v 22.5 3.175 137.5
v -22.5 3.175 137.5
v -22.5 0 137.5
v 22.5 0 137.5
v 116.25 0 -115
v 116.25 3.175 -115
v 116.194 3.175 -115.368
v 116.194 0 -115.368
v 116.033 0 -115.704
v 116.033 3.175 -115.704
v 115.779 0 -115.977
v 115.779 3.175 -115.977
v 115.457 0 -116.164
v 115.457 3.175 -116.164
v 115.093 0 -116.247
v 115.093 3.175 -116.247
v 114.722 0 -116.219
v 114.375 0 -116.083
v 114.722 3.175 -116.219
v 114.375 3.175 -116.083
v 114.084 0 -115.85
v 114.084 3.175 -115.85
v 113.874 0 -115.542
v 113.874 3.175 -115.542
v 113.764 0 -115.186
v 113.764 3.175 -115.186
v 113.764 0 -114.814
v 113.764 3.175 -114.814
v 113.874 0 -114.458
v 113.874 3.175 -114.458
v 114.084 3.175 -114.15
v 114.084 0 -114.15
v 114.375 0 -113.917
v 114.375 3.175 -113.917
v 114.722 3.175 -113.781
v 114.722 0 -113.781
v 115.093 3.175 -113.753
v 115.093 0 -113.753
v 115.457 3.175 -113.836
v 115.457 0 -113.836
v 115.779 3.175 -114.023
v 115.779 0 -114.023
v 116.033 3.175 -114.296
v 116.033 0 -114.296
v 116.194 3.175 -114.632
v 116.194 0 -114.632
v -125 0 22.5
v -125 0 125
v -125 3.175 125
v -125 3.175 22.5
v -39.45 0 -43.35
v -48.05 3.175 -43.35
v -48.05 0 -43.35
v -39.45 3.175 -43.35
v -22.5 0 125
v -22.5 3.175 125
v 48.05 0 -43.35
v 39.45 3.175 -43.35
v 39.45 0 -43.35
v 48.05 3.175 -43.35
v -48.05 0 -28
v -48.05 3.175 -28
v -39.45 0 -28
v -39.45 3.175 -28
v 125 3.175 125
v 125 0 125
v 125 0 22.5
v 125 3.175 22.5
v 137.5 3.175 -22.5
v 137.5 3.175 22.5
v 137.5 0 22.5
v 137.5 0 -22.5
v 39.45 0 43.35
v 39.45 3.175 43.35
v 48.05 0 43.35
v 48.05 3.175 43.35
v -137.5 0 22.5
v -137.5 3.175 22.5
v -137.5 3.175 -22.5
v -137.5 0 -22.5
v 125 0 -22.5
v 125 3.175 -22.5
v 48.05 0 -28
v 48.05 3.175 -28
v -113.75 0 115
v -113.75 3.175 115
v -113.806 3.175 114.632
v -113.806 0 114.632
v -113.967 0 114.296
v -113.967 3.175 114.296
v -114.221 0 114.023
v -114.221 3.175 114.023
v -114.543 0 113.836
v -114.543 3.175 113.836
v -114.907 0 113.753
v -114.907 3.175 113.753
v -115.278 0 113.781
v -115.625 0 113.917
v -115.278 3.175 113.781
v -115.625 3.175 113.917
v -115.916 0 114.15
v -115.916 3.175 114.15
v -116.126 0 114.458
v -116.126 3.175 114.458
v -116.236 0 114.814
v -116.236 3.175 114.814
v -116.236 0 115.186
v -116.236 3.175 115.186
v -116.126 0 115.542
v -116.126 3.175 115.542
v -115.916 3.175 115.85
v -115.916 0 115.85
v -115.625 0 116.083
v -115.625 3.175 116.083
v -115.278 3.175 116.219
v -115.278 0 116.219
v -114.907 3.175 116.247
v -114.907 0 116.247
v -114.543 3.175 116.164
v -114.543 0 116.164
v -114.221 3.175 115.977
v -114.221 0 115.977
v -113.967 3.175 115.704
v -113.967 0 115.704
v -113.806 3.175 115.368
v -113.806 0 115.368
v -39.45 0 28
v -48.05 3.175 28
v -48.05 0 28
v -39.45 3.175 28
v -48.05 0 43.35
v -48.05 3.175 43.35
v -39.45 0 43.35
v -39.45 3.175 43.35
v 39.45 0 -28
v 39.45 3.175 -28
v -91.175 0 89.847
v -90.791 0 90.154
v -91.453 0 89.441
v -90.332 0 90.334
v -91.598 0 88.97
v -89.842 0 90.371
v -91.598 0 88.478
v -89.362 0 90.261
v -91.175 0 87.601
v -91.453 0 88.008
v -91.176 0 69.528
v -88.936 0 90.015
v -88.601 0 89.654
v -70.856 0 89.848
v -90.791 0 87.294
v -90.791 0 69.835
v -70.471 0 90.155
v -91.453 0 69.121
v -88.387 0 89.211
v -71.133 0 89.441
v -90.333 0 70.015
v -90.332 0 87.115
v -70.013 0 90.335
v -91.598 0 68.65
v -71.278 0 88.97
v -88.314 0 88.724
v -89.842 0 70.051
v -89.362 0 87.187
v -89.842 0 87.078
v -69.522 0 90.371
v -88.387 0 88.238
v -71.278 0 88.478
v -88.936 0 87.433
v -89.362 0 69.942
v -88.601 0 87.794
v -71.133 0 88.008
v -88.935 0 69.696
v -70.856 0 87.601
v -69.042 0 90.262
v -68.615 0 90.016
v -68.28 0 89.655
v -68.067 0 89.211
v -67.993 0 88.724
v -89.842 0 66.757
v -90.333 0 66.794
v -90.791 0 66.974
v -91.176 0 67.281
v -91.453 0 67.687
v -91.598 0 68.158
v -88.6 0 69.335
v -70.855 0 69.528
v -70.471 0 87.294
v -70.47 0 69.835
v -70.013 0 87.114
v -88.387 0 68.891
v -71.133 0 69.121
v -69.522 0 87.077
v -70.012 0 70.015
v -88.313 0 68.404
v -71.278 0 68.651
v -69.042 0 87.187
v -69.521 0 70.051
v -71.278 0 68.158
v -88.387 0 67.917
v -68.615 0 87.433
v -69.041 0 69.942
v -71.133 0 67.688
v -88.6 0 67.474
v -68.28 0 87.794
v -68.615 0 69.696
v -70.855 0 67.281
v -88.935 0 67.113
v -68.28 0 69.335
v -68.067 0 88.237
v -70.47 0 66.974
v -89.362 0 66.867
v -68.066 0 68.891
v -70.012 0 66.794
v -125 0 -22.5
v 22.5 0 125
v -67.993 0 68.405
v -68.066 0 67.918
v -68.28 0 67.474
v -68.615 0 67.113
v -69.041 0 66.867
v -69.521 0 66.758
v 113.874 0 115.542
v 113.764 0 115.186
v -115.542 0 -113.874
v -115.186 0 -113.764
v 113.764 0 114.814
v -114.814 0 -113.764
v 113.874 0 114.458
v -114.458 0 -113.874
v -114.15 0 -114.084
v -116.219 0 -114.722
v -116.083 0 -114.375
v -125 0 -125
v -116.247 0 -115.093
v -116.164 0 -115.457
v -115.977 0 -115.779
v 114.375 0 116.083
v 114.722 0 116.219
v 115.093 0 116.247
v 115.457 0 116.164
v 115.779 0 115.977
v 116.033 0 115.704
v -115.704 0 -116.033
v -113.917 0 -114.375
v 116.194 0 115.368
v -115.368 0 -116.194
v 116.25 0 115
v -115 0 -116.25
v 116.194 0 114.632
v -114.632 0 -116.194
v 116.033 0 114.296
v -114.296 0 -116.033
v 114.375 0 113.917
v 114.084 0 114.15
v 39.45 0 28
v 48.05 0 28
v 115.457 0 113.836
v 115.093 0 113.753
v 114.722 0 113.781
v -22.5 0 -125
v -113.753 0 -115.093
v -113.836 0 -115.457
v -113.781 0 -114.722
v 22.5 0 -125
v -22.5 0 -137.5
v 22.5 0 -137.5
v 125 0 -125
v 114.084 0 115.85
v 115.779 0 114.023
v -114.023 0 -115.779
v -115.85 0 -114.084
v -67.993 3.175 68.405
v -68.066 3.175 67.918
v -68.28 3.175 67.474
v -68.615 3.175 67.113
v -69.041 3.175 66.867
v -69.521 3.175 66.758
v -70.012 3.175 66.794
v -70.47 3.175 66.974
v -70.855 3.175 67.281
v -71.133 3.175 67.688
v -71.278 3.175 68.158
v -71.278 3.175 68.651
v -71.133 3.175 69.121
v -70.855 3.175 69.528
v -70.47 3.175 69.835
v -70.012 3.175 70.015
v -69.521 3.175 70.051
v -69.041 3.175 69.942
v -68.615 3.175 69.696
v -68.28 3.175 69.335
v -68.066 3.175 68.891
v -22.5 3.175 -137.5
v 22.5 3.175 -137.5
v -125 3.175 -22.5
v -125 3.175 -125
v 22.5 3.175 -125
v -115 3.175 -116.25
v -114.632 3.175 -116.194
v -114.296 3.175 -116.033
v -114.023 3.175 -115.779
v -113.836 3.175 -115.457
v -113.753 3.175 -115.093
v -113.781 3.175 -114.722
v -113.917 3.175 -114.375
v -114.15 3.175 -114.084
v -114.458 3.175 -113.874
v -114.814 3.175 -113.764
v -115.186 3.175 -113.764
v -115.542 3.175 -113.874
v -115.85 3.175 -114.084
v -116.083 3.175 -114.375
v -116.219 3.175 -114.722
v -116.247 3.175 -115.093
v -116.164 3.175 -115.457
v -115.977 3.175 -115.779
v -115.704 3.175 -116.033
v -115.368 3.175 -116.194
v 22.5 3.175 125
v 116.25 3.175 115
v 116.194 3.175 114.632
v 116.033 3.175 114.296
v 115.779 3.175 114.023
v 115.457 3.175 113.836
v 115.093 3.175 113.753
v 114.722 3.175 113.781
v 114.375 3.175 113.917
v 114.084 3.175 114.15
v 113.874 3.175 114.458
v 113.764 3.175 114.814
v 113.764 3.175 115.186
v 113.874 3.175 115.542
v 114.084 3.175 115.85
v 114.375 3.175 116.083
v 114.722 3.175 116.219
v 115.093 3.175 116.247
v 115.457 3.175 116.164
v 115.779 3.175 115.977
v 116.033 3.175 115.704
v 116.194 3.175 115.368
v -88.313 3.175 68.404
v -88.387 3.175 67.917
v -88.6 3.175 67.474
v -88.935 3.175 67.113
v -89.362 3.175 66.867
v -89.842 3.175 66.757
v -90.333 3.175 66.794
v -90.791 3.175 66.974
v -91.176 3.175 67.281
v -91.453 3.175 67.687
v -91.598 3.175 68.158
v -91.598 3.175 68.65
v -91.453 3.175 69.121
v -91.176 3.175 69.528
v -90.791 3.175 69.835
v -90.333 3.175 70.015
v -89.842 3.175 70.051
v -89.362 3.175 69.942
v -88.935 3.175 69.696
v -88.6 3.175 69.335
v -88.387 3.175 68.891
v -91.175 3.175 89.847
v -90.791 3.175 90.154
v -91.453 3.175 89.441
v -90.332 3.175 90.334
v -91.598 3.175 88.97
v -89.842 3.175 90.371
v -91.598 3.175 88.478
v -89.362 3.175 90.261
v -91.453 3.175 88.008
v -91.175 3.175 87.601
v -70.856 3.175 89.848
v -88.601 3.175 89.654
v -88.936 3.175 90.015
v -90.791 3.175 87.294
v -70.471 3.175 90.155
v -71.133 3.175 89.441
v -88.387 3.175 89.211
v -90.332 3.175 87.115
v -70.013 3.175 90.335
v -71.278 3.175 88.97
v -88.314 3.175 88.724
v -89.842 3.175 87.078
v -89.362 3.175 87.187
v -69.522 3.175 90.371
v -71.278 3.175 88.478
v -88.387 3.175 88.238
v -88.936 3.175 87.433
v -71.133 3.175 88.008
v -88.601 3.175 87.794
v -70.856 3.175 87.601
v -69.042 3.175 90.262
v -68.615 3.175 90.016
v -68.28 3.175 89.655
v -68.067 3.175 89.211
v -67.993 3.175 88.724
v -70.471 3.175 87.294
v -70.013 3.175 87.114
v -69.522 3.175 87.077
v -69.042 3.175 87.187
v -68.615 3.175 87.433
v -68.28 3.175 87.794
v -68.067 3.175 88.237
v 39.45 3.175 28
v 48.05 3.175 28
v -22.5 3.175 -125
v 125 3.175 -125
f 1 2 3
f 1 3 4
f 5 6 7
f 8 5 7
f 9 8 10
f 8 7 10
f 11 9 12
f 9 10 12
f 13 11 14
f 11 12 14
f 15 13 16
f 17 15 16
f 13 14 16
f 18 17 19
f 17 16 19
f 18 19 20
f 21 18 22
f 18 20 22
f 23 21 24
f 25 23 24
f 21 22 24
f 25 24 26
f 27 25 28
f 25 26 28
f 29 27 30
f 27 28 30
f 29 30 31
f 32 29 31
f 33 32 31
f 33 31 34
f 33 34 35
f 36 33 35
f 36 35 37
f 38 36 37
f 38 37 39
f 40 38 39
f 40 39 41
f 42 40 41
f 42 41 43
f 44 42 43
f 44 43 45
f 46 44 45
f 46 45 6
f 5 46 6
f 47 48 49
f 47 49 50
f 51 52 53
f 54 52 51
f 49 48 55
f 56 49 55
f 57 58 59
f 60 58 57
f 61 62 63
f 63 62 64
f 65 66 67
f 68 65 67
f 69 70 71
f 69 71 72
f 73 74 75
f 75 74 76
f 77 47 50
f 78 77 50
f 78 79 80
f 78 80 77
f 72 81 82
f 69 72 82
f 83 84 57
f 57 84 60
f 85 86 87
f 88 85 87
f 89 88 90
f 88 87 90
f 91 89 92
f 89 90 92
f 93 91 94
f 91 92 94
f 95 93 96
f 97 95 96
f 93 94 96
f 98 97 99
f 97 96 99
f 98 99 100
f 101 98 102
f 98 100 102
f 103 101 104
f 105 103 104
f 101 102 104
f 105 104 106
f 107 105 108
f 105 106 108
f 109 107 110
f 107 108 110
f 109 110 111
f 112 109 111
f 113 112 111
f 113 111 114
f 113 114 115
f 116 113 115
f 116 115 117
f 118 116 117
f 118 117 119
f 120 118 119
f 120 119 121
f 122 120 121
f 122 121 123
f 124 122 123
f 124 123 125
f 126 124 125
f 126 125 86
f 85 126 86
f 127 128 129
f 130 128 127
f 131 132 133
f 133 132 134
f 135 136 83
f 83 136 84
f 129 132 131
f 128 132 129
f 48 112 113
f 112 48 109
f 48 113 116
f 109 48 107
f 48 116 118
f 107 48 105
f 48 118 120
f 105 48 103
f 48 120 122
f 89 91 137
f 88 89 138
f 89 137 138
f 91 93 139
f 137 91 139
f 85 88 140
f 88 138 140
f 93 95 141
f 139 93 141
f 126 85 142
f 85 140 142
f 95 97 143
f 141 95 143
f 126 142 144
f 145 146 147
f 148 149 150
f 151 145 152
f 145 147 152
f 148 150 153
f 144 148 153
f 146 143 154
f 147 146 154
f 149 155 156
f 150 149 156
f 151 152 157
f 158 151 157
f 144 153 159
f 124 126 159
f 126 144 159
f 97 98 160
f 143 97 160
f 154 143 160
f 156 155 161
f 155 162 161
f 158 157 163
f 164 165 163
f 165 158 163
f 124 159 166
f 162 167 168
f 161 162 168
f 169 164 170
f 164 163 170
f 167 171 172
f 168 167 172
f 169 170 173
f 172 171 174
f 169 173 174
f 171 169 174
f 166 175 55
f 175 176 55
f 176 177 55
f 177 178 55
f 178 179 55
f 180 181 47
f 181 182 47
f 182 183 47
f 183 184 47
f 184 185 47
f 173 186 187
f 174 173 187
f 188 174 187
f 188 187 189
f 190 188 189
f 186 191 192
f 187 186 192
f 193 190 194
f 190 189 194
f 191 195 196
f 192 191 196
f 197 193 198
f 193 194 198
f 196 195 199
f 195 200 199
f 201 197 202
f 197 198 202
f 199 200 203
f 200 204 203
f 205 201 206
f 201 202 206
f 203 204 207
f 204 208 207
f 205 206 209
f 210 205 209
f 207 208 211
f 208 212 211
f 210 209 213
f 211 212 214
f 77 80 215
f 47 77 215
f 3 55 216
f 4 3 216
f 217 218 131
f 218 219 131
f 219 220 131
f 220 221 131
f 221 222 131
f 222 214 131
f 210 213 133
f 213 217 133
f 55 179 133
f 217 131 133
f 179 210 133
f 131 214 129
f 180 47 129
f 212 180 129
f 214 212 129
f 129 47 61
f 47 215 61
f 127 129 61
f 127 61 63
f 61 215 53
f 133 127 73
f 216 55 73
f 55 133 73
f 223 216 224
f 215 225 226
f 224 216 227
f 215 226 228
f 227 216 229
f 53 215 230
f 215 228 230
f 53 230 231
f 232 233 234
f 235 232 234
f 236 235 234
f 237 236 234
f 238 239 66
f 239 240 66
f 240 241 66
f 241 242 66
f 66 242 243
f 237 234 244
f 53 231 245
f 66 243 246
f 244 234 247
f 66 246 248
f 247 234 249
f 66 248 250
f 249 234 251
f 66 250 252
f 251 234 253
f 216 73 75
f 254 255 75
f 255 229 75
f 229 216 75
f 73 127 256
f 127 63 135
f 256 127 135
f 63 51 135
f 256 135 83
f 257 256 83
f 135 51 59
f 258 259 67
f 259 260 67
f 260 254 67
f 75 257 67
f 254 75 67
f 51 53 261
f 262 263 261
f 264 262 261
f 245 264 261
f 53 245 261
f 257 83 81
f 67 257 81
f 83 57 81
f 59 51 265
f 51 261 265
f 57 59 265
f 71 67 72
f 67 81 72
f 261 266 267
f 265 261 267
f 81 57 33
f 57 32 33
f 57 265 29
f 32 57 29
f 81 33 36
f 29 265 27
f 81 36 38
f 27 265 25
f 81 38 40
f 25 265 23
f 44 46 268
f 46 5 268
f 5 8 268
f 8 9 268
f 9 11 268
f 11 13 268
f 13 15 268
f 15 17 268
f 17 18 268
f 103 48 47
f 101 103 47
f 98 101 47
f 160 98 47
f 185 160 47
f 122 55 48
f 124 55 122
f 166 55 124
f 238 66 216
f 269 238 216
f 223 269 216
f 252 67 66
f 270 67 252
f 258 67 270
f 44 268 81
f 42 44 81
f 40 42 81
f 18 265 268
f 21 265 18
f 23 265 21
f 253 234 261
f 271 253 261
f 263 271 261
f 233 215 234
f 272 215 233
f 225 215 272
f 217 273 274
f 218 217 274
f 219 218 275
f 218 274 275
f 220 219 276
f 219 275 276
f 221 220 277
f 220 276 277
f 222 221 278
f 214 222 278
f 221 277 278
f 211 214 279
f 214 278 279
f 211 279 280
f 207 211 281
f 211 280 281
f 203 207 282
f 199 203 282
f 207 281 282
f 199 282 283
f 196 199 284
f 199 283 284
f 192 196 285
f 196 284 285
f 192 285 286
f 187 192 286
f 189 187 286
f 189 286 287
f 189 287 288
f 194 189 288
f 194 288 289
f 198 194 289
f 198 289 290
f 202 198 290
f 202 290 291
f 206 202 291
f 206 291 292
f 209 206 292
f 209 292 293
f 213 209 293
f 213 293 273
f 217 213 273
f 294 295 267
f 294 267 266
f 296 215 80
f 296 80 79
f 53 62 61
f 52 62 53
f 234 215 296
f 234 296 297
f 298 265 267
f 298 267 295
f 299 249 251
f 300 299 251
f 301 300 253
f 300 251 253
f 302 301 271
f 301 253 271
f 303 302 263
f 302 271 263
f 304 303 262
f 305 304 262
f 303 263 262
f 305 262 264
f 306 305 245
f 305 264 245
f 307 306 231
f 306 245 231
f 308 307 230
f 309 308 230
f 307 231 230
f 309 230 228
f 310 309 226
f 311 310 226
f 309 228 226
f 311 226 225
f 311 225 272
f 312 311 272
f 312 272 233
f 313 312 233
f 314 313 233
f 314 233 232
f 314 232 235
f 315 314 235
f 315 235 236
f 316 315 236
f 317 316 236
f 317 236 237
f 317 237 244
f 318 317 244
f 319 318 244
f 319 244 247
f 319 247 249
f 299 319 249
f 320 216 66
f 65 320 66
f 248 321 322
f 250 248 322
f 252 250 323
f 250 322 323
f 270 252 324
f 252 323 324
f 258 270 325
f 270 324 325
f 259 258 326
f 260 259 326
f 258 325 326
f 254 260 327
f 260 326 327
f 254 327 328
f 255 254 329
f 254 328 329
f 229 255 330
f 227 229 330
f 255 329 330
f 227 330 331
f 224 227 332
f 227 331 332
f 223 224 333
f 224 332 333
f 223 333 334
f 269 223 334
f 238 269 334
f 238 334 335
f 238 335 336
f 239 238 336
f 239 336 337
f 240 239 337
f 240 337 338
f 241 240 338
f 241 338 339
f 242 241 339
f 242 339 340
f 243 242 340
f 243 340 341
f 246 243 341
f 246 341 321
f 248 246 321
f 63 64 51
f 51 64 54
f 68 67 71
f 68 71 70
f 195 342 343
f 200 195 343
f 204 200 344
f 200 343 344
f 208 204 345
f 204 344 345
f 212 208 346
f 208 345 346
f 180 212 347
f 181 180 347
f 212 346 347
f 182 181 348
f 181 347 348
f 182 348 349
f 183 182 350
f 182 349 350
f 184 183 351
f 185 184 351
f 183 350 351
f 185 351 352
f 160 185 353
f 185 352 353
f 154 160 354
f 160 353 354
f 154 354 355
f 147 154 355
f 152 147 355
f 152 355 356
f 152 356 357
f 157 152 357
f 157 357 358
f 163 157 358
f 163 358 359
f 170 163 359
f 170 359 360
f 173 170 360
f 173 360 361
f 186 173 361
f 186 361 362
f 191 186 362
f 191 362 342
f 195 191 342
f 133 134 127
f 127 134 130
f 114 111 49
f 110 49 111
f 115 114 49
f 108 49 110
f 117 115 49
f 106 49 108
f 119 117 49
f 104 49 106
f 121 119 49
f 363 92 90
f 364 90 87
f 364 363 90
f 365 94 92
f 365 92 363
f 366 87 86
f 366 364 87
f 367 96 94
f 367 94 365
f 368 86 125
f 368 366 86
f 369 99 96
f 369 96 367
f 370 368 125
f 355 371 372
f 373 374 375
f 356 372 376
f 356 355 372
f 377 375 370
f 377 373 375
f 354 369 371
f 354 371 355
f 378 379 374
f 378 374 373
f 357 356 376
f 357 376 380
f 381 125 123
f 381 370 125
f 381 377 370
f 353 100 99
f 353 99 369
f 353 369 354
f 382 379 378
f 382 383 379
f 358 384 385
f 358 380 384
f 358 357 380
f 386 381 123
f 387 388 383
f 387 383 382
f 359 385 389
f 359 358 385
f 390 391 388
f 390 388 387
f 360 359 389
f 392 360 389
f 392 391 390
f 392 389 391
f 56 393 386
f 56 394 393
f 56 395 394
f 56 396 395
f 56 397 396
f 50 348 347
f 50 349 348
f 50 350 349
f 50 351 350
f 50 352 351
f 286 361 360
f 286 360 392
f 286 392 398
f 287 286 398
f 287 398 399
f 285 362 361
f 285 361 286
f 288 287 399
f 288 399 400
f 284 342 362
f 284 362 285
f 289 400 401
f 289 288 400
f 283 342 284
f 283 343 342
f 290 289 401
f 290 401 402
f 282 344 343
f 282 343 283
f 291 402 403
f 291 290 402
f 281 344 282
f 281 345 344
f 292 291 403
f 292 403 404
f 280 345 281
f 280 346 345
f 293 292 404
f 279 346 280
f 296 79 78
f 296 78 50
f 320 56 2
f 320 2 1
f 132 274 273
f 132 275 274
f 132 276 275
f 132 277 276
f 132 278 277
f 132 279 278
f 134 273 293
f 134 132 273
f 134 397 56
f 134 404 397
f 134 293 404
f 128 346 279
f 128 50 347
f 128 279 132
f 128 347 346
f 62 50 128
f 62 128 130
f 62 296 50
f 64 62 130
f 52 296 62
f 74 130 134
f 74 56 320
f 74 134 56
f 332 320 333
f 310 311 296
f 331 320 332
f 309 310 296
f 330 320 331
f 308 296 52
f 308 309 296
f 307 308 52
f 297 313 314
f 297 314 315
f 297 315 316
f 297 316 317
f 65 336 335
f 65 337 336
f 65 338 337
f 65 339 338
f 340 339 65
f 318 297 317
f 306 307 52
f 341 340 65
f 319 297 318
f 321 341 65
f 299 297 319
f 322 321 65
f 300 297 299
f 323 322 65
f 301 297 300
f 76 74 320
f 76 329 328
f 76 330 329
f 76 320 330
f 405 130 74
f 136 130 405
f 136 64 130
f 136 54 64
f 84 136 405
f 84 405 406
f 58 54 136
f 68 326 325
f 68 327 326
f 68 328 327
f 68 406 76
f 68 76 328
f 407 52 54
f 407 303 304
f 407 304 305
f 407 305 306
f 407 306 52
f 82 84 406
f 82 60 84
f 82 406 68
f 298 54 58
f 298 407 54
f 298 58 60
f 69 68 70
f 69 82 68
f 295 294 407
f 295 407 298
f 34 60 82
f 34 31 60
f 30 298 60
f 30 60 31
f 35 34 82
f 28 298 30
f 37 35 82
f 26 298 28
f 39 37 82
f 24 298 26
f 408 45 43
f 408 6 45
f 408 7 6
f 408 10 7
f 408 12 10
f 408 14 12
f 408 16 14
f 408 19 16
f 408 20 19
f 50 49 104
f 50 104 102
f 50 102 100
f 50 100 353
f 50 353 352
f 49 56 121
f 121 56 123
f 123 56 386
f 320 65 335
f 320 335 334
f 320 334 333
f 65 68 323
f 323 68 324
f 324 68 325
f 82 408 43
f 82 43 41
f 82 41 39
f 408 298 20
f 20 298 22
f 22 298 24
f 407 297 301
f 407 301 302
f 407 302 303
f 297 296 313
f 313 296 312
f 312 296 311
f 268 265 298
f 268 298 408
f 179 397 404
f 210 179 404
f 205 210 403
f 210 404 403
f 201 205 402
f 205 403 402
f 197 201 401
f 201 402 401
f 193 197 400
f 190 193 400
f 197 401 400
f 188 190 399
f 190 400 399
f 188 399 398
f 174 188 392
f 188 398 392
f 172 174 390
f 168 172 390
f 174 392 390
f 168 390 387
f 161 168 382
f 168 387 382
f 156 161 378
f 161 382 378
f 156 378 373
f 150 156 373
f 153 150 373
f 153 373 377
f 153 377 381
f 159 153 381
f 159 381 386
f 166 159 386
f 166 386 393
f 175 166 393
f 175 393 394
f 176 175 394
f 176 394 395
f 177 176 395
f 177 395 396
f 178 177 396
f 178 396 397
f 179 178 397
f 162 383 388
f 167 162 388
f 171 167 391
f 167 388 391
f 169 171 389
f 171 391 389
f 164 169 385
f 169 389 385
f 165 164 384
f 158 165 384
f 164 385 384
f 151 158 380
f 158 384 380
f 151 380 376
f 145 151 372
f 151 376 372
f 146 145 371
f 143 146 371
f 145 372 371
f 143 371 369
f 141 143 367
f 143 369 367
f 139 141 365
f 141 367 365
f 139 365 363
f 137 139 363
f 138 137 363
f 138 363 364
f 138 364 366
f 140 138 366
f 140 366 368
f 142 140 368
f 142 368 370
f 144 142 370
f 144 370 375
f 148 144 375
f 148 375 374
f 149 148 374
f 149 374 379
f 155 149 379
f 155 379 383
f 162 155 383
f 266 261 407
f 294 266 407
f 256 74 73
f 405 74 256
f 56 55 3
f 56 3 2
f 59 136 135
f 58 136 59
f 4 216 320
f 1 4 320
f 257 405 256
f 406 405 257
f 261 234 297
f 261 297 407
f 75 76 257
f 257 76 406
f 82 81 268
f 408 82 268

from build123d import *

# Parameters (mm, degrees)
SKETCH2_W           = 250
SKETCH2_H           = 250
BOSS_EXTRUDE1_DEPTH = 3.175
SKETCH3_W           = 8.6
SKETCH3_H           = 15.35
CUT_EXTRUDE1_DEPTH  = 10
SKETCH10_W          = 45
SKETCH10_H          = 3.175
BOSS_EXTRUDE2_DEPTH = 12.5
SKETCH11_W          = 45
SKETCH11_H          = 3.175
BOSS_EXTRUDE3_DEPTH = 12.5
SKETCH13_W          = 45
SKETCH13_H          = 3.175
BOSS_EXTRUDE4_DEPTH = 12.5
SKETCH14_W          = 45
SKETCH14_H          = 3.175
BOSS_EXTRUDE5_DEPTH = 12.5
M3_TAPPED_HOLE1_D   = 2.5
SKETCH21_R          = 1.25
CUT_EXTRUDE2_DEPTH  = 10
SKETCH22_R          = 1.651881978
SKETCH22_R_2        = 1.65156012
SKETCH22_R_3        = 1.651864629
SKETCH22_R_4        = 1.651
CUT_EXTRUDE3_DEPTH  = 4.175


with BuildPart() as part:
    # Sketch2 → Boss-Extrude1 (new body)
    with BuildSketch(Plane(origin=(0, 0, 0), x_dir=(1, 0, 0), z_dir=(0, 1, 0))):
        Rectangle(SKETCH2_W, SKETCH2_H)
    extrude(amount=BOSS_EXTRUDE1_DEPTH)

    # Sketch3 → Cut-Extrude1 (cut)
    with BuildSketch(Plane(origin=(0, 3.175, 0), x_dir=(1, 0, 0), z_dir=(0, 1, 0))):
        with Locations((-43.75, 35.675)):
            Rectangle(SKETCH3_W, SKETCH3_H)
        with Locations((-43.75, -35.675)):
            Rectangle(SKETCH3_W, SKETCH3_H)
        with Locations((43.75, -35.675)):
            Rectangle(SKETCH3_W, SKETCH3_H)
        with Locations((43.75, 35.675)):
            Rectangle(SKETCH3_W, SKETCH3_H)
    extrude(amount=-CUT_EXTRUDE1_DEPTH, mode=Mode.SUBTRACT)

    # Sketch10 → Boss-Extrude2 (add)
    with BuildSketch(Plane(origin=(0, 0, -125), x_dir=(-1, 0, 0), z_dir=(0, 0, -1))):
        with Locations((0, 1.5875)):
            Rectangle(SKETCH10_W, SKETCH10_H)
    extrude(amount=BOSS_EXTRUDE2_DEPTH)

    # Sketch11 → Boss-Extrude3 (add)
    with BuildSketch(Plane.ZY.offset(125)):
        with Locations((0, 1.5875)):
            Rectangle(SKETCH11_W, SKETCH11_H)
    extrude(amount=BOSS_EXTRUDE3_DEPTH)

    # Sketch13 → Boss-Extrude4 (add)
    with BuildSketch(Plane.XY.offset(125)):
        with Locations((0, 1.5875)):
            Rectangle(SKETCH13_W, SKETCH13_H)
    extrude(amount=BOSS_EXTRUDE4_DEPTH)

    # Sketch14 → Boss-Extrude5 (add)
    with BuildSketch(Plane(origin=(125, 0, 0), x_dir=(0, 0, -1), z_dir=(1, 0, 0))):
        with Locations((0, 1.5875)):
            Rectangle(SKETCH14_W, SKETCH14_H)
    extrude(amount=BOSS_EXTRUDE5_DEPTH)

    # M3 Tapped Hole1 (through all)
    with Locations(Plane(origin=(-115, 3.175, -115), x_dir=(0, 0, 1), z_dir=(0, 1, 0))):
        with Locations((0, 0)):
            Hole(M3_TAPPED_HOLE1_D / 2)

    # Sketch21 → Cut-Extrude2 (cut)
    with BuildSketch(Plane(origin=(0, 3.175, 0), x_dir=(1, 0, 0), z_dir=(0, 1, 0))):
        with Locations((115, 115)):
            Circle(SKETCH21_R)
        with Locations((115, -115)):
            Circle(SKETCH21_R)
        with Locations((-115, -115)):
            Circle(SKETCH21_R)
    extrude(amount=-CUT_EXTRUDE2_DEPTH, mode=Mode.SUBTRACT)

    # Sketch22 → Cut-Extrude3 (cut, through all)
    with BuildSketch(Plane(origin=(0, 3.175, 0), x_dir=(1, 0, 0), z_dir=(0, 1, 0))):
        with Locations((-89.96501808, -68.404219496)):
            Circle(SKETCH22_R)
        with Locations((-69.644539433, -68.404527337)):
            Circle(SKETCH22_R_2)
        with Locations((-69.644998895, -88.724239252)):
            Circle(SKETCH22_R_3)
        with Locations((-89.965017771, -88.724219998)):
            Circle(SKETCH22_R_4)
    extrude(amount=-CUT_EXTRUDE3_DEPTH, mode=Mode.SUBTRACT)


solid = part.part
